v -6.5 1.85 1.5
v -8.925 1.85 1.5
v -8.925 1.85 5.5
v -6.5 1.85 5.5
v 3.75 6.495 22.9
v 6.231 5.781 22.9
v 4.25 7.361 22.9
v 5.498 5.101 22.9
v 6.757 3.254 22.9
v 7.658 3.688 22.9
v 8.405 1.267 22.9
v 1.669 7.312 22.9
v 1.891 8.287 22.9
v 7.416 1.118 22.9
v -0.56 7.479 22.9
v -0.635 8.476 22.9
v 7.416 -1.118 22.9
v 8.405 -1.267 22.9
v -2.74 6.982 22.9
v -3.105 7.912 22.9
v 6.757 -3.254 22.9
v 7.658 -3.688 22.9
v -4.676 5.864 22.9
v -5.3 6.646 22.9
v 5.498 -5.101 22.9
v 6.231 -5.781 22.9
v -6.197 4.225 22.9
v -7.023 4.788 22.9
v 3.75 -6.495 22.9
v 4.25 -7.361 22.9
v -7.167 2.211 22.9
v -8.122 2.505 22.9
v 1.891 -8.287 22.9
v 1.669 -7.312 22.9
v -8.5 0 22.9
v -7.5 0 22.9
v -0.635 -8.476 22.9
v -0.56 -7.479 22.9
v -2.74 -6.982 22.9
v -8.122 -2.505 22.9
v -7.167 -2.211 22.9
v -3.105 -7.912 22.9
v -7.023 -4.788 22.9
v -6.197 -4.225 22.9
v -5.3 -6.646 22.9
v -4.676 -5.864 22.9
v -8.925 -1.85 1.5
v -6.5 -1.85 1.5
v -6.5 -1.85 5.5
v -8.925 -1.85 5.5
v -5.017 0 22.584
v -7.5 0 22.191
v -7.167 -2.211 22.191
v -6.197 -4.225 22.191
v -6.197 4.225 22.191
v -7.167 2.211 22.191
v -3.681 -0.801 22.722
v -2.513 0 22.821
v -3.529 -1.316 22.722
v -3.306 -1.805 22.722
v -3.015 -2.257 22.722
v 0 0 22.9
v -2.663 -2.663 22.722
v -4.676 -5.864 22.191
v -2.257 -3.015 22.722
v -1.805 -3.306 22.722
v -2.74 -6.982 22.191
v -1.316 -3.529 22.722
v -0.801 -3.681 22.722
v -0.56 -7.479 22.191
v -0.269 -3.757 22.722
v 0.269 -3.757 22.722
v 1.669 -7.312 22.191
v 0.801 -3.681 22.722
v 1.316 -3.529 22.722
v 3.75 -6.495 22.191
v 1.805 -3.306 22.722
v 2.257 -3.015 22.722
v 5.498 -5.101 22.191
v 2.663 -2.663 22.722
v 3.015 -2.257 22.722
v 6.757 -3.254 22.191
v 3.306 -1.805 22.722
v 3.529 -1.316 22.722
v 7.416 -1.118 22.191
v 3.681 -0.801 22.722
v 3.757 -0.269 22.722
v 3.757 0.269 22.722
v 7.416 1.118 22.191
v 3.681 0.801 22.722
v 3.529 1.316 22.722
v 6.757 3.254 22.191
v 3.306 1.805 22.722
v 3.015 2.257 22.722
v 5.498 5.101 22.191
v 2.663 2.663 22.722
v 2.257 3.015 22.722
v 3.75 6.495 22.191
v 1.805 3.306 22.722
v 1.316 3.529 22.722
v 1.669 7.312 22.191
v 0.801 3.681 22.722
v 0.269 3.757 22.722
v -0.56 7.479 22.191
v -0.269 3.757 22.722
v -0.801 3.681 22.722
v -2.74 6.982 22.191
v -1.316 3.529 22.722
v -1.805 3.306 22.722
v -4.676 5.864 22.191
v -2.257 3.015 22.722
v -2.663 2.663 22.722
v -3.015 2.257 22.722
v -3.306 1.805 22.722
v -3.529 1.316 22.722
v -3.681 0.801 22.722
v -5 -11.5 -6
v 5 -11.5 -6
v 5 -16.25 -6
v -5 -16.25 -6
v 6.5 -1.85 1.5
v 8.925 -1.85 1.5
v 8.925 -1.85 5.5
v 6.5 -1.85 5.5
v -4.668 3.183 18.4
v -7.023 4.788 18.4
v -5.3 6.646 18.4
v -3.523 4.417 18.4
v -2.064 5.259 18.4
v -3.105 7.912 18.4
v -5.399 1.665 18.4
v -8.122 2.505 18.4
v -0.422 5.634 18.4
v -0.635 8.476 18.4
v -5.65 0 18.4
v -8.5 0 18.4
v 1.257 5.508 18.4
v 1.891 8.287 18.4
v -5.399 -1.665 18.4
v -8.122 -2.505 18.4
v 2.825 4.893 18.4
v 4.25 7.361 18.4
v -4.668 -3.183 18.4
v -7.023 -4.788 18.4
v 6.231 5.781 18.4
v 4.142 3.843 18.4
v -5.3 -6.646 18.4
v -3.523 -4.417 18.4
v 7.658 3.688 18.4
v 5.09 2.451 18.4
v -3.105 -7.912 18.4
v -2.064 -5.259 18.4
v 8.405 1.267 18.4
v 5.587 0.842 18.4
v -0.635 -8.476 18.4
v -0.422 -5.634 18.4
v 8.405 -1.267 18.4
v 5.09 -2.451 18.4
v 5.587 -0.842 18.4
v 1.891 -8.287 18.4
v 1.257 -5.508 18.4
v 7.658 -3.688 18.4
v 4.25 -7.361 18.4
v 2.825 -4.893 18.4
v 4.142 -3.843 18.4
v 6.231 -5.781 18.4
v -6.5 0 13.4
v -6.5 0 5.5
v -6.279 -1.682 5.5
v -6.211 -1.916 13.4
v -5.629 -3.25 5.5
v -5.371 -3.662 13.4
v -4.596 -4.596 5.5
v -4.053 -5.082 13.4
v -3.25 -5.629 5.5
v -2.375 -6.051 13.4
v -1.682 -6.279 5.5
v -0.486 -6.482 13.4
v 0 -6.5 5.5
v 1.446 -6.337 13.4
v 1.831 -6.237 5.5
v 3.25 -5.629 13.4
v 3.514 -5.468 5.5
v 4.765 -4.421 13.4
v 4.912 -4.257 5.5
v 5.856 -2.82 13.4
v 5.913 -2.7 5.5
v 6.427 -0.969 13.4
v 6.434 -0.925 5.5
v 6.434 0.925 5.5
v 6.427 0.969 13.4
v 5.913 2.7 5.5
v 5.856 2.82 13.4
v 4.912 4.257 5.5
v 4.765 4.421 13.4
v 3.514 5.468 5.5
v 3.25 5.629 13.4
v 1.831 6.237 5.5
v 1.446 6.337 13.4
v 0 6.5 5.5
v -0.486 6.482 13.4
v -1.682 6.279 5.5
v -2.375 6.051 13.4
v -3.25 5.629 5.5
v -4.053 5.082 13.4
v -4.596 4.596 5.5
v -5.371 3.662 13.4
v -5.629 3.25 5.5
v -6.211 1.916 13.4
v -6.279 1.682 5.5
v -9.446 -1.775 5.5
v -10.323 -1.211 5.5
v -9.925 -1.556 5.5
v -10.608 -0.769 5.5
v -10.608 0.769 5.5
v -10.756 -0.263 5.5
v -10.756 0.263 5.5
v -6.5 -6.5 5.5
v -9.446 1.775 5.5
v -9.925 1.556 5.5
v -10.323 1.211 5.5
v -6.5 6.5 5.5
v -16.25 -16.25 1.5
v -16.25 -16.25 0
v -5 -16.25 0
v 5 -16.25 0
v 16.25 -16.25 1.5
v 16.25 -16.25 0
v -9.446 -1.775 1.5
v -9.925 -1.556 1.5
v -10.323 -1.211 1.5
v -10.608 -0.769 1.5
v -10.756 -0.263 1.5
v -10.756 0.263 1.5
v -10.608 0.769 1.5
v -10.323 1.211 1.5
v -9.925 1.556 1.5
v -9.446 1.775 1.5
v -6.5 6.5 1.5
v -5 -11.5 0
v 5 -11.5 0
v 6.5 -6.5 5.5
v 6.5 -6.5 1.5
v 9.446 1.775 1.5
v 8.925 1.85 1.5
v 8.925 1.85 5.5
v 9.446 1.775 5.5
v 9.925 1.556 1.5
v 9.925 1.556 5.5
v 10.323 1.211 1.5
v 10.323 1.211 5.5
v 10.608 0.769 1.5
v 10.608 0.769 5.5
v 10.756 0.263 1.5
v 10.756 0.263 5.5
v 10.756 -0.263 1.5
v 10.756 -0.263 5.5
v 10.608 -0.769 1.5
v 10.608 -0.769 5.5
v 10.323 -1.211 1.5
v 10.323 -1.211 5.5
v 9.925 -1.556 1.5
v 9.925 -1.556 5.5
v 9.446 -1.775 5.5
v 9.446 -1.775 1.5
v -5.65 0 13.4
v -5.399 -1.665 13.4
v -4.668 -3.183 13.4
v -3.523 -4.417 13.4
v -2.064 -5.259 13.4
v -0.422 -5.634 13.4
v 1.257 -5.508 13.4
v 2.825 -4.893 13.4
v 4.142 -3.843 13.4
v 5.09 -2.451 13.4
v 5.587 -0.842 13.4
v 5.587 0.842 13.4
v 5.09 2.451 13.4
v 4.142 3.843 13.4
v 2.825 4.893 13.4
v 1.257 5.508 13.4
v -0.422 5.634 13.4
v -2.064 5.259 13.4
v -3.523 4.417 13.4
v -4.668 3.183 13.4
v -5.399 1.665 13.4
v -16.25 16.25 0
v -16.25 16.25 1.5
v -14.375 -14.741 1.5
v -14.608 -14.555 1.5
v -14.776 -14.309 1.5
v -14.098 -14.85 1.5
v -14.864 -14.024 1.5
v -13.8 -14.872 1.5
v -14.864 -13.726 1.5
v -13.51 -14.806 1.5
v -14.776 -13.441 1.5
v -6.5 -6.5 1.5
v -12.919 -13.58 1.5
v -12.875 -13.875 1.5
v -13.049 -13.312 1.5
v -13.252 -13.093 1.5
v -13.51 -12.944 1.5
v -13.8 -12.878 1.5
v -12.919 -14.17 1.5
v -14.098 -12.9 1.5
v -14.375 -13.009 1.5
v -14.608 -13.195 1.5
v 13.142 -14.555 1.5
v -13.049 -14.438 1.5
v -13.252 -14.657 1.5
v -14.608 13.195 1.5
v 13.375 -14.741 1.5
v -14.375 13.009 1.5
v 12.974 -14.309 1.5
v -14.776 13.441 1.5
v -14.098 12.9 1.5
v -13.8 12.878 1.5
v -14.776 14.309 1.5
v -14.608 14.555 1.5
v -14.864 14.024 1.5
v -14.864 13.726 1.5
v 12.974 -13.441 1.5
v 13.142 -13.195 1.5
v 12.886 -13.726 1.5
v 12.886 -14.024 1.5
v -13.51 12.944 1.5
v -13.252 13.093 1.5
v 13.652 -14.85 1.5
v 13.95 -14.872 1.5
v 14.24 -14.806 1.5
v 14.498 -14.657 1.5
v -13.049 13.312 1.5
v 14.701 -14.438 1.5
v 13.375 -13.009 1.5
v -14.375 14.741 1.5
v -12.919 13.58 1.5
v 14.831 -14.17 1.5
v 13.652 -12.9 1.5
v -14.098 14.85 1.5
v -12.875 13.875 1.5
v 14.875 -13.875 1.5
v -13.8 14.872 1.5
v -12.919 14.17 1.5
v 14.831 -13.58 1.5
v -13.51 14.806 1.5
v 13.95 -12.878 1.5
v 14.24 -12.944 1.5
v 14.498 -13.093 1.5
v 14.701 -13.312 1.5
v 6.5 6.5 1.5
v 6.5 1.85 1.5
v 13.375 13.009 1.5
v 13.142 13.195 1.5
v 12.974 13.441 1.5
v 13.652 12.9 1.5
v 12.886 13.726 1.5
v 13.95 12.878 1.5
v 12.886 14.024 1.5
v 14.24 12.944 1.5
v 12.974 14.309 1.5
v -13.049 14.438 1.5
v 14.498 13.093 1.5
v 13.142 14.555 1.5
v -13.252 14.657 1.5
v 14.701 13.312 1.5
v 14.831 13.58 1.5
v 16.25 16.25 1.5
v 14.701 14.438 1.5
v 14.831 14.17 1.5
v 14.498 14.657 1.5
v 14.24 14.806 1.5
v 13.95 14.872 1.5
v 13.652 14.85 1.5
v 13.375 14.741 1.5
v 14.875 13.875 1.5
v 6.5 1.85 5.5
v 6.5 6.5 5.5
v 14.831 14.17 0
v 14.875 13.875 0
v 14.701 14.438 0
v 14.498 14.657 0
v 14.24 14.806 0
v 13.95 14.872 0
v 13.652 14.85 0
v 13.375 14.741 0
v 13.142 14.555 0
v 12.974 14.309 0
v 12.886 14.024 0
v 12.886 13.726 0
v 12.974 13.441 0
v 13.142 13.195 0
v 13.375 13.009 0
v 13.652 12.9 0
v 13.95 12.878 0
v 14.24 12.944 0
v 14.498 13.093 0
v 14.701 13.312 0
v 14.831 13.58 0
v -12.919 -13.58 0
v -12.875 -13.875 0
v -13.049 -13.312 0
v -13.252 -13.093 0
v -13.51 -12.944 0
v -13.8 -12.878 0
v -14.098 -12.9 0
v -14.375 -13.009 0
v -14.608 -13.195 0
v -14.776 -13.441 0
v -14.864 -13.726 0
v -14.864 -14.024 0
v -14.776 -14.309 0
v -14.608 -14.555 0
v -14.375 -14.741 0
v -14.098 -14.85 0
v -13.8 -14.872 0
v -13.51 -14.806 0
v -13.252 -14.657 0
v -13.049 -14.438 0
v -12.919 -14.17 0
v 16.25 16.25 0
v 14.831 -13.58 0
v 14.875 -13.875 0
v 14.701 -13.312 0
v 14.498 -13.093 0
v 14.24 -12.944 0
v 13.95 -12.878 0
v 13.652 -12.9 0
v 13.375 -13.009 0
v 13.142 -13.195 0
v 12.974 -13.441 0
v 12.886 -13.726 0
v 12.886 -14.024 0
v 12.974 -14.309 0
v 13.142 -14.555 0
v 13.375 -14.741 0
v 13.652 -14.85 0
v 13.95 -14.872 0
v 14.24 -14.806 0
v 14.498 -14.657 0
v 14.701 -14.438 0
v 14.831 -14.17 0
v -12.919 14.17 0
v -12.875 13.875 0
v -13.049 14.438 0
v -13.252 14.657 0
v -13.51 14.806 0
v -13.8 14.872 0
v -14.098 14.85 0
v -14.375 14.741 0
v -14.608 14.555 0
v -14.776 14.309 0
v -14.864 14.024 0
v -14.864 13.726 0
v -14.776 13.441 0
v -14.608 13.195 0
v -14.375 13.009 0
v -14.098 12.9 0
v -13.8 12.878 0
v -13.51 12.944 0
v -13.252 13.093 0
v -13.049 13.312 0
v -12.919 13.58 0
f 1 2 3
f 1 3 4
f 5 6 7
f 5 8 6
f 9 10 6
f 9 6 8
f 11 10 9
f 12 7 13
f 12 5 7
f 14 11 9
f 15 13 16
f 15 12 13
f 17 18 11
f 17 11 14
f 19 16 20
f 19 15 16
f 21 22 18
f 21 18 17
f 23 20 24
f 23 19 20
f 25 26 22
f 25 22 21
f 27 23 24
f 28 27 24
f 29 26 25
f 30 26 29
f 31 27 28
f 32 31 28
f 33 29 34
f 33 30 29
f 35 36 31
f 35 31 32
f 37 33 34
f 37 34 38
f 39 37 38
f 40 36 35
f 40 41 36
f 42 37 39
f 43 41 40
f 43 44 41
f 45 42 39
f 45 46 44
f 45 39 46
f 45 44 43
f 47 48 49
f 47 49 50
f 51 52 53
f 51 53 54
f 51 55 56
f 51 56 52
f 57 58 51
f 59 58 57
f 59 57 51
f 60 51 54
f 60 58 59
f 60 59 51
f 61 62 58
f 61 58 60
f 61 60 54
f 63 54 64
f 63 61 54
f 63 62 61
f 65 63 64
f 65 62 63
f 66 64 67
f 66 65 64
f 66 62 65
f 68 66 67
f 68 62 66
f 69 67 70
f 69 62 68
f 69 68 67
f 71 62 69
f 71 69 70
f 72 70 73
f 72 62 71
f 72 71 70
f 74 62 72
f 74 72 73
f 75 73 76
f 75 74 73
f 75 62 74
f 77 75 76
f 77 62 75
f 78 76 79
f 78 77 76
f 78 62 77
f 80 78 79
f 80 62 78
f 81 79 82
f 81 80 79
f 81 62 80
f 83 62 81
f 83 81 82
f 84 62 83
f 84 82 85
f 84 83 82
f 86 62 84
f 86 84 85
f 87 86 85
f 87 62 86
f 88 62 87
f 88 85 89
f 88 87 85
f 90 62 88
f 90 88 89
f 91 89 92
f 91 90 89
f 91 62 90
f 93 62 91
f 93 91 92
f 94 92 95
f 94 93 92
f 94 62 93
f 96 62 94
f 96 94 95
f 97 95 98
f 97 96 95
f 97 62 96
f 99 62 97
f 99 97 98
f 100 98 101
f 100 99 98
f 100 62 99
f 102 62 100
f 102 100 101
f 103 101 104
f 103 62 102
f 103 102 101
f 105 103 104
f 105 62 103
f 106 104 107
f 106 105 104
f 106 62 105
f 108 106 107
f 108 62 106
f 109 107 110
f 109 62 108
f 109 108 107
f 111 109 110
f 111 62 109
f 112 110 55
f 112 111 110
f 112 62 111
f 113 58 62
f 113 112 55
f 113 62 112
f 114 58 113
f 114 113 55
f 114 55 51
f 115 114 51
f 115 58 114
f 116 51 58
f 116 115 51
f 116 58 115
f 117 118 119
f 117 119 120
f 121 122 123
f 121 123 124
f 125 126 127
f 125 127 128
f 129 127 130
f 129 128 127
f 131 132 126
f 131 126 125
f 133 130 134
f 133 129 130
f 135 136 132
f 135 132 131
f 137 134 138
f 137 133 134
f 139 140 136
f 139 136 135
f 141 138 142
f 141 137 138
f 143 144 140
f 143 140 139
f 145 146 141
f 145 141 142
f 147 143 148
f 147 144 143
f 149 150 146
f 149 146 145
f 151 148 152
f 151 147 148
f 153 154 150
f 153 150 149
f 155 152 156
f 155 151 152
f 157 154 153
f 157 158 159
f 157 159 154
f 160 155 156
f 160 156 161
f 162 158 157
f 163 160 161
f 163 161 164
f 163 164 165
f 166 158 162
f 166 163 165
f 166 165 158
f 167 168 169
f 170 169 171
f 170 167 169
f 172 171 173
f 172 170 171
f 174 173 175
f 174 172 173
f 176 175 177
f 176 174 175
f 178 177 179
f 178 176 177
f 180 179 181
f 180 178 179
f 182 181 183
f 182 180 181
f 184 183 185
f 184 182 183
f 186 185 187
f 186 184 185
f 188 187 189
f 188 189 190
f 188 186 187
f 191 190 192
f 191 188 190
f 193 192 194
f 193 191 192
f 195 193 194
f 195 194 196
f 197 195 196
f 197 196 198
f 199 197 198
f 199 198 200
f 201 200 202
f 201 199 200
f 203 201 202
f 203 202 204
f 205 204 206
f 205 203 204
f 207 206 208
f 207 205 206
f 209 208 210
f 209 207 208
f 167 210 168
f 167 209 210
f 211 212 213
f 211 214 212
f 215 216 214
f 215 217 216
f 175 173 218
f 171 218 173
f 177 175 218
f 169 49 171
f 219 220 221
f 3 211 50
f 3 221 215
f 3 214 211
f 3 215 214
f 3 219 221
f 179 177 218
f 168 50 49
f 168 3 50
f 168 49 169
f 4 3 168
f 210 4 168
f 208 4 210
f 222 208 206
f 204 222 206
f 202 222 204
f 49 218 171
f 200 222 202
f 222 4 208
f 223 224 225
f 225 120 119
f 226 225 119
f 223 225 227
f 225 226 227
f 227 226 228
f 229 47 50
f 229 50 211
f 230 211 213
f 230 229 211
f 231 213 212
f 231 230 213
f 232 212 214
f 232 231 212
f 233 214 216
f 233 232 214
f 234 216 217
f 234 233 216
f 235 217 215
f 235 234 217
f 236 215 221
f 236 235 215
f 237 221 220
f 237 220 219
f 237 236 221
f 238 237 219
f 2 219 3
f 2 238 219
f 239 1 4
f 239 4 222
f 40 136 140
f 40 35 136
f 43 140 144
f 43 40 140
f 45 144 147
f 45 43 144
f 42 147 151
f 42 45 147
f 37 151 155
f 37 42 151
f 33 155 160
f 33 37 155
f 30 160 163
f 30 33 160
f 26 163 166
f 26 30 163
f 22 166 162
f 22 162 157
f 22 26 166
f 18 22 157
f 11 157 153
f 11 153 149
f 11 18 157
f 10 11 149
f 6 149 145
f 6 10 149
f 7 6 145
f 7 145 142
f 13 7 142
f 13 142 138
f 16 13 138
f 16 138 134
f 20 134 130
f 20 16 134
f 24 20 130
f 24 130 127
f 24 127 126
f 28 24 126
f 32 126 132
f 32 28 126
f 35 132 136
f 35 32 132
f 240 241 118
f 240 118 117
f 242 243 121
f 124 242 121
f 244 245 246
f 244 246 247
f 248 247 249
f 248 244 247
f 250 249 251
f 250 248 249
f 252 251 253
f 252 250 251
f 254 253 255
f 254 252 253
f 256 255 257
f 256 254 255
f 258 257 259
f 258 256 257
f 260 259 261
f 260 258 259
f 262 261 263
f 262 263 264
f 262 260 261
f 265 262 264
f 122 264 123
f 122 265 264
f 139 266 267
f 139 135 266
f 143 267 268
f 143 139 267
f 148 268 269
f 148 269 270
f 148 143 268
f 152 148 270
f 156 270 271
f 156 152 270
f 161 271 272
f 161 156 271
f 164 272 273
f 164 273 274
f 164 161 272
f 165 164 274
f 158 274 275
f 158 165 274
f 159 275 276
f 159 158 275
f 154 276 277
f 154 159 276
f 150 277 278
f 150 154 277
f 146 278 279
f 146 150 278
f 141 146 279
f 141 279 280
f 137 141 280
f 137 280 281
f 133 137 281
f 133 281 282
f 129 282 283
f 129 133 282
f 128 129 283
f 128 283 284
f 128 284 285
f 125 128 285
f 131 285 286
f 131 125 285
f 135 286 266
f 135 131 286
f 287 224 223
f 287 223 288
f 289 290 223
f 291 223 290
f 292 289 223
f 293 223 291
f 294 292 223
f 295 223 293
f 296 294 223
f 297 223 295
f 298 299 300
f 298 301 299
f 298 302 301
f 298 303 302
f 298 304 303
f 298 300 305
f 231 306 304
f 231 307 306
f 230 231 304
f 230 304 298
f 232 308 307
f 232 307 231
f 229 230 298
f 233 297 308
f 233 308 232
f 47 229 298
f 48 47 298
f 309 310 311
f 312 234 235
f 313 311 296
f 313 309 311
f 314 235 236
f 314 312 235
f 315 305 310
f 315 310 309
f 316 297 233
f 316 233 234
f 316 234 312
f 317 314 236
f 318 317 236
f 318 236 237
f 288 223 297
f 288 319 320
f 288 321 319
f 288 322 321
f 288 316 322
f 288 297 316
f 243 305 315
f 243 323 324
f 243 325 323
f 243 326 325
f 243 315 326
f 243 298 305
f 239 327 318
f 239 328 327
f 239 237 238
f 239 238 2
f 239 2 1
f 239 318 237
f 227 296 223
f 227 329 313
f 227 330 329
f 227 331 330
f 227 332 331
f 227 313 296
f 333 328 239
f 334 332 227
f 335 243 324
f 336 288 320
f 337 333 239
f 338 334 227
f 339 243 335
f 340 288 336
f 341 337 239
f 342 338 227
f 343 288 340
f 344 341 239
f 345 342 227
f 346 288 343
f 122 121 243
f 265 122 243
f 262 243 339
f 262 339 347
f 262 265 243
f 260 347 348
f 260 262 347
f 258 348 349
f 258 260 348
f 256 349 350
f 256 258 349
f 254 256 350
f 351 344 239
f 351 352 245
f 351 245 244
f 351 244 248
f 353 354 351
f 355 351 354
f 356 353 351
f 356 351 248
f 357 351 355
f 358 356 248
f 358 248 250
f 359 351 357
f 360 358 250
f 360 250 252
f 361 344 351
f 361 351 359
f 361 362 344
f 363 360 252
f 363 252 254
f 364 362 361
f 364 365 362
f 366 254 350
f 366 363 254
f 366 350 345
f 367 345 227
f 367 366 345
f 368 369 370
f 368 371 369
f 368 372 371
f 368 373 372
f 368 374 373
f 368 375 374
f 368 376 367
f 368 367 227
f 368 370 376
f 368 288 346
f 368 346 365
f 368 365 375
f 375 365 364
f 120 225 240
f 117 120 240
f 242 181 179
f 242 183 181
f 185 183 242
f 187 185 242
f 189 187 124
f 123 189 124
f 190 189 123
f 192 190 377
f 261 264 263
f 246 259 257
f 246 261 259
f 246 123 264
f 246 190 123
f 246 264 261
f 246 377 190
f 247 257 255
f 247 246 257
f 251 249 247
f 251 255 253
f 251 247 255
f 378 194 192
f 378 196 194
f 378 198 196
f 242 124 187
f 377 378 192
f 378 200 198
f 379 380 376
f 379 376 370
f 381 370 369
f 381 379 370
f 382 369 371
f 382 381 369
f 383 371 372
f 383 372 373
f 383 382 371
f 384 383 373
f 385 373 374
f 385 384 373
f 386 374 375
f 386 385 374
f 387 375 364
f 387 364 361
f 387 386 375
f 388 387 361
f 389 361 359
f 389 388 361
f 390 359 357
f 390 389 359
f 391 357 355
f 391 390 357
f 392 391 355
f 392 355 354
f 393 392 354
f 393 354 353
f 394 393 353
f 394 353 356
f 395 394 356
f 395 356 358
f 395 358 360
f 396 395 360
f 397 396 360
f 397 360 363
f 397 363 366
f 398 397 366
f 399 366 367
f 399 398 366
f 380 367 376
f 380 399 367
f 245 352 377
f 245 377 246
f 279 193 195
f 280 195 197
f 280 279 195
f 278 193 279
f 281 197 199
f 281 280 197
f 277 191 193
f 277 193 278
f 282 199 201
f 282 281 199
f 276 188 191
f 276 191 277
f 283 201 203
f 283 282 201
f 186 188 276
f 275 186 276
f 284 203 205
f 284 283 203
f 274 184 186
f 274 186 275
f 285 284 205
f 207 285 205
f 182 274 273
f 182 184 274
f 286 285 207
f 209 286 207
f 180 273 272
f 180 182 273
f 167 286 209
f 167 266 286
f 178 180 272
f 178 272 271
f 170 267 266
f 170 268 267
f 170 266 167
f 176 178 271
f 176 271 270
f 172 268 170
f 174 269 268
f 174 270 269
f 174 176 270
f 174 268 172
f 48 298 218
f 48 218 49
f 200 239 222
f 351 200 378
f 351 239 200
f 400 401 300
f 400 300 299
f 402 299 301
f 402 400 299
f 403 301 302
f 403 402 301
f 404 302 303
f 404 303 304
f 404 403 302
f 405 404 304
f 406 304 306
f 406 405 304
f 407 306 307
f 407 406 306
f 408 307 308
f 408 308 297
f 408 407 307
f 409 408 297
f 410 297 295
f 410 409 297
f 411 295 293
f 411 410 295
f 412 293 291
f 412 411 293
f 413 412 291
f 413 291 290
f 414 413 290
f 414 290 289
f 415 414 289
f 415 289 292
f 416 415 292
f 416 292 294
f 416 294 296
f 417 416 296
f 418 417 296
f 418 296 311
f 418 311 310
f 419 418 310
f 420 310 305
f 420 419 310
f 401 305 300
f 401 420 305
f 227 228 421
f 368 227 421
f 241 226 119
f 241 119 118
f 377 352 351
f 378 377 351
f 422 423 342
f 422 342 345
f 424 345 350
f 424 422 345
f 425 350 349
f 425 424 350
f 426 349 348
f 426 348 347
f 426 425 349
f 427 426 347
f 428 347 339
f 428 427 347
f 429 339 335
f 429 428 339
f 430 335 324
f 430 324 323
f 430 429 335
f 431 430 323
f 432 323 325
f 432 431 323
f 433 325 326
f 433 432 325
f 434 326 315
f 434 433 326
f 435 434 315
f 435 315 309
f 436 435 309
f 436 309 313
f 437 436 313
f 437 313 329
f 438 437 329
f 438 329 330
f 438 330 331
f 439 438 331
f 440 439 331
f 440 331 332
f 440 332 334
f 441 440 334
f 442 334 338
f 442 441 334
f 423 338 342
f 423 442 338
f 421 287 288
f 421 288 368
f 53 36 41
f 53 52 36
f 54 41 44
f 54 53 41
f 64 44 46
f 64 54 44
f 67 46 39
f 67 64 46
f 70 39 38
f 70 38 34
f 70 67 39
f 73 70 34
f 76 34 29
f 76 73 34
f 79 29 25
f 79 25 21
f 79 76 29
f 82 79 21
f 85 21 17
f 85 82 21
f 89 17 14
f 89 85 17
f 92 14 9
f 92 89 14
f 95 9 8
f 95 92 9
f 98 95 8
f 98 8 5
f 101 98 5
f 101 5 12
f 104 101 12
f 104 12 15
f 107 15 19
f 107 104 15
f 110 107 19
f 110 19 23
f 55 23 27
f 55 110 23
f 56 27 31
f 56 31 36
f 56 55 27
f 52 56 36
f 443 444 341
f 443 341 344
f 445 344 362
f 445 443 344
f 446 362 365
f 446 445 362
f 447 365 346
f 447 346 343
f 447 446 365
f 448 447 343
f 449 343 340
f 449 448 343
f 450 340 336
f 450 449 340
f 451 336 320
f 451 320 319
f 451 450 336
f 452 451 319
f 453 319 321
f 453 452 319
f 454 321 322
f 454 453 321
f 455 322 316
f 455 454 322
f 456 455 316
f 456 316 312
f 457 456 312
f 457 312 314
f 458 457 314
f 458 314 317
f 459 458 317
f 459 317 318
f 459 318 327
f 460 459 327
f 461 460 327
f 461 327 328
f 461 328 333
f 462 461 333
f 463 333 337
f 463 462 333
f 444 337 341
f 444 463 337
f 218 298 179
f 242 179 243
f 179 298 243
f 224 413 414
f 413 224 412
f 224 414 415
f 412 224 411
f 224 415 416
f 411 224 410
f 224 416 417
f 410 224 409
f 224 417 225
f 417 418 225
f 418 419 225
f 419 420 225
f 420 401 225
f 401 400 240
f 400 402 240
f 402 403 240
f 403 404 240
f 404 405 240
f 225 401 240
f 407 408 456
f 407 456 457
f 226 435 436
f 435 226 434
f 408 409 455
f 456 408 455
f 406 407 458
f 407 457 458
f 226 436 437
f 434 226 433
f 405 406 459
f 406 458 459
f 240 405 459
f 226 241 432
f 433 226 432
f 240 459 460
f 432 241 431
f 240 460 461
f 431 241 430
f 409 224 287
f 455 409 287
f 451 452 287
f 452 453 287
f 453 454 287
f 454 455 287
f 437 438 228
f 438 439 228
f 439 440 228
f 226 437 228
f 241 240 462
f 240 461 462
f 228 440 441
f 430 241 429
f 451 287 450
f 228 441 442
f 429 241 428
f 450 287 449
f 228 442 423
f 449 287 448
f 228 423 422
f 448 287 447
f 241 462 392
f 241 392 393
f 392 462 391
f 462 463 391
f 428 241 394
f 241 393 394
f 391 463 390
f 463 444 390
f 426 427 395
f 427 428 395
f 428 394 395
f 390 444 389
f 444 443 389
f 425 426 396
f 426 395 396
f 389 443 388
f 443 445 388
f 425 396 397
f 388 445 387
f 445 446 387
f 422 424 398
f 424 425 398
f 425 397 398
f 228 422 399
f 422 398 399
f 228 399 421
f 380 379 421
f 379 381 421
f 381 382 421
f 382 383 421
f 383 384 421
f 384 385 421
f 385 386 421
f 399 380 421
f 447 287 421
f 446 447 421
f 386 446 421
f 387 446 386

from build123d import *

# Parameters (mm, degrees)
SKETCH2_W           = 32.5
SKETCH2_H           = 32.5
SKETCH2_R           = 1
BOSS_EXTRUDE1_DEPTH = 1.5
SKETCH4_W           = 13
SKETCH4_H           = 13
BOSS_EXTRUDE2_DEPTH = 4
SKETCH6_W           = 10
SKETCH6_H           = 4.75
BOSS_EXTRUDE3_DEPTH = 6


with BuildPart() as part:
    # Sketch2 → Boss-Extrude1 (new body)
    with BuildSketch(Plane.XY):
        Rectangle(SKETCH2_W, SKETCH2_H)
        with Locations((13.875, 13.875)):
            Circle(SKETCH2_R, mode=Mode.SUBTRACT)
        with Locations((13.875, -13.875)):
            Circle(SKETCH2_R, mode=Mode.SUBTRACT)
        with Locations((-13.875, -13.875)):
            Circle(SKETCH2_R, mode=Mode.SUBTRACT)
        with Locations((-13.875, 13.875)):
            Circle(SKETCH2_R, mode=Mode.SUBTRACT)
    extrude(amount=BOSS_EXTRUDE1_DEPTH)

    # Sketch4 → Boss-Extrude2 (add)
    with BuildSketch(Plane.XY.offset(1.5)):
        Rectangle(SKETCH4_W, SKETCH4_H)
        with BuildLine():
            Line((8.925, -1.85), (-8.925, -1.85))
            ThreePointArc((-8.925, -1.85), (-10.775, 0), (-8.925, 1.85))
            Line((-8.925, 1.85), (8.925, 1.85))
            ThreePointArc((8.925, 1.85), (10.775, 0), (8.925, -1.85))
        make_face()
    extrude(amount=BOSS_EXTRUDE2_DEPTH)

    # Sketch5 → Revolve1 (revolve)
    with BuildSketch(Plane(origin=(0, 0, 0), x_dir=(1, 0, 0), z_dir=(0, 1, 0)), mode=Mode.PRIVATE) as revolve1_sk:
        with BuildLine():
            Line((0, -5.5), (6.5, -5.5))
            Line((6.5, -5.5), (6.5, -13.4))
            Line((6.5, -13.4), (5.65, -13.4))
            Line((5.65, -13.4), (5.65, -18.4))
            Line((5.65, -18.4), (8.5, -18.4))
            Line((8.5, -18.4), (8.5, -22.9))
            Line((8.5, -22.9), (7.5, -22.9))
            Line((7.5, -22.9), (7.5, -22.190584114))
            ThreePointArc((7.5, -22.190584114), (3.76673834, -22.722251095), (0, -22.9))
            Line((0, -22.9), (0, -5.5))
        make_face()
    revolve(revolve1_sk.sketch.rotate(Axis((0, 0, 0), (0, 0, 1)), 180), axis=Axis((0, 0, 0), (0, 0, 1)))

    # Sketch6 → Boss-Extrude3 (add)
    with BuildSketch(Plane(origin=(0, 0, 0), x_dir=(-1, 0, 0), z_dir=(0, 0, -1))):
        with Locations((0, -13.875)):
            Rectangle(SKETCH6_W, SKETCH6_H)
    extrude(amount=BOSS_EXTRUDE3_DEPTH)


solid = part.part
